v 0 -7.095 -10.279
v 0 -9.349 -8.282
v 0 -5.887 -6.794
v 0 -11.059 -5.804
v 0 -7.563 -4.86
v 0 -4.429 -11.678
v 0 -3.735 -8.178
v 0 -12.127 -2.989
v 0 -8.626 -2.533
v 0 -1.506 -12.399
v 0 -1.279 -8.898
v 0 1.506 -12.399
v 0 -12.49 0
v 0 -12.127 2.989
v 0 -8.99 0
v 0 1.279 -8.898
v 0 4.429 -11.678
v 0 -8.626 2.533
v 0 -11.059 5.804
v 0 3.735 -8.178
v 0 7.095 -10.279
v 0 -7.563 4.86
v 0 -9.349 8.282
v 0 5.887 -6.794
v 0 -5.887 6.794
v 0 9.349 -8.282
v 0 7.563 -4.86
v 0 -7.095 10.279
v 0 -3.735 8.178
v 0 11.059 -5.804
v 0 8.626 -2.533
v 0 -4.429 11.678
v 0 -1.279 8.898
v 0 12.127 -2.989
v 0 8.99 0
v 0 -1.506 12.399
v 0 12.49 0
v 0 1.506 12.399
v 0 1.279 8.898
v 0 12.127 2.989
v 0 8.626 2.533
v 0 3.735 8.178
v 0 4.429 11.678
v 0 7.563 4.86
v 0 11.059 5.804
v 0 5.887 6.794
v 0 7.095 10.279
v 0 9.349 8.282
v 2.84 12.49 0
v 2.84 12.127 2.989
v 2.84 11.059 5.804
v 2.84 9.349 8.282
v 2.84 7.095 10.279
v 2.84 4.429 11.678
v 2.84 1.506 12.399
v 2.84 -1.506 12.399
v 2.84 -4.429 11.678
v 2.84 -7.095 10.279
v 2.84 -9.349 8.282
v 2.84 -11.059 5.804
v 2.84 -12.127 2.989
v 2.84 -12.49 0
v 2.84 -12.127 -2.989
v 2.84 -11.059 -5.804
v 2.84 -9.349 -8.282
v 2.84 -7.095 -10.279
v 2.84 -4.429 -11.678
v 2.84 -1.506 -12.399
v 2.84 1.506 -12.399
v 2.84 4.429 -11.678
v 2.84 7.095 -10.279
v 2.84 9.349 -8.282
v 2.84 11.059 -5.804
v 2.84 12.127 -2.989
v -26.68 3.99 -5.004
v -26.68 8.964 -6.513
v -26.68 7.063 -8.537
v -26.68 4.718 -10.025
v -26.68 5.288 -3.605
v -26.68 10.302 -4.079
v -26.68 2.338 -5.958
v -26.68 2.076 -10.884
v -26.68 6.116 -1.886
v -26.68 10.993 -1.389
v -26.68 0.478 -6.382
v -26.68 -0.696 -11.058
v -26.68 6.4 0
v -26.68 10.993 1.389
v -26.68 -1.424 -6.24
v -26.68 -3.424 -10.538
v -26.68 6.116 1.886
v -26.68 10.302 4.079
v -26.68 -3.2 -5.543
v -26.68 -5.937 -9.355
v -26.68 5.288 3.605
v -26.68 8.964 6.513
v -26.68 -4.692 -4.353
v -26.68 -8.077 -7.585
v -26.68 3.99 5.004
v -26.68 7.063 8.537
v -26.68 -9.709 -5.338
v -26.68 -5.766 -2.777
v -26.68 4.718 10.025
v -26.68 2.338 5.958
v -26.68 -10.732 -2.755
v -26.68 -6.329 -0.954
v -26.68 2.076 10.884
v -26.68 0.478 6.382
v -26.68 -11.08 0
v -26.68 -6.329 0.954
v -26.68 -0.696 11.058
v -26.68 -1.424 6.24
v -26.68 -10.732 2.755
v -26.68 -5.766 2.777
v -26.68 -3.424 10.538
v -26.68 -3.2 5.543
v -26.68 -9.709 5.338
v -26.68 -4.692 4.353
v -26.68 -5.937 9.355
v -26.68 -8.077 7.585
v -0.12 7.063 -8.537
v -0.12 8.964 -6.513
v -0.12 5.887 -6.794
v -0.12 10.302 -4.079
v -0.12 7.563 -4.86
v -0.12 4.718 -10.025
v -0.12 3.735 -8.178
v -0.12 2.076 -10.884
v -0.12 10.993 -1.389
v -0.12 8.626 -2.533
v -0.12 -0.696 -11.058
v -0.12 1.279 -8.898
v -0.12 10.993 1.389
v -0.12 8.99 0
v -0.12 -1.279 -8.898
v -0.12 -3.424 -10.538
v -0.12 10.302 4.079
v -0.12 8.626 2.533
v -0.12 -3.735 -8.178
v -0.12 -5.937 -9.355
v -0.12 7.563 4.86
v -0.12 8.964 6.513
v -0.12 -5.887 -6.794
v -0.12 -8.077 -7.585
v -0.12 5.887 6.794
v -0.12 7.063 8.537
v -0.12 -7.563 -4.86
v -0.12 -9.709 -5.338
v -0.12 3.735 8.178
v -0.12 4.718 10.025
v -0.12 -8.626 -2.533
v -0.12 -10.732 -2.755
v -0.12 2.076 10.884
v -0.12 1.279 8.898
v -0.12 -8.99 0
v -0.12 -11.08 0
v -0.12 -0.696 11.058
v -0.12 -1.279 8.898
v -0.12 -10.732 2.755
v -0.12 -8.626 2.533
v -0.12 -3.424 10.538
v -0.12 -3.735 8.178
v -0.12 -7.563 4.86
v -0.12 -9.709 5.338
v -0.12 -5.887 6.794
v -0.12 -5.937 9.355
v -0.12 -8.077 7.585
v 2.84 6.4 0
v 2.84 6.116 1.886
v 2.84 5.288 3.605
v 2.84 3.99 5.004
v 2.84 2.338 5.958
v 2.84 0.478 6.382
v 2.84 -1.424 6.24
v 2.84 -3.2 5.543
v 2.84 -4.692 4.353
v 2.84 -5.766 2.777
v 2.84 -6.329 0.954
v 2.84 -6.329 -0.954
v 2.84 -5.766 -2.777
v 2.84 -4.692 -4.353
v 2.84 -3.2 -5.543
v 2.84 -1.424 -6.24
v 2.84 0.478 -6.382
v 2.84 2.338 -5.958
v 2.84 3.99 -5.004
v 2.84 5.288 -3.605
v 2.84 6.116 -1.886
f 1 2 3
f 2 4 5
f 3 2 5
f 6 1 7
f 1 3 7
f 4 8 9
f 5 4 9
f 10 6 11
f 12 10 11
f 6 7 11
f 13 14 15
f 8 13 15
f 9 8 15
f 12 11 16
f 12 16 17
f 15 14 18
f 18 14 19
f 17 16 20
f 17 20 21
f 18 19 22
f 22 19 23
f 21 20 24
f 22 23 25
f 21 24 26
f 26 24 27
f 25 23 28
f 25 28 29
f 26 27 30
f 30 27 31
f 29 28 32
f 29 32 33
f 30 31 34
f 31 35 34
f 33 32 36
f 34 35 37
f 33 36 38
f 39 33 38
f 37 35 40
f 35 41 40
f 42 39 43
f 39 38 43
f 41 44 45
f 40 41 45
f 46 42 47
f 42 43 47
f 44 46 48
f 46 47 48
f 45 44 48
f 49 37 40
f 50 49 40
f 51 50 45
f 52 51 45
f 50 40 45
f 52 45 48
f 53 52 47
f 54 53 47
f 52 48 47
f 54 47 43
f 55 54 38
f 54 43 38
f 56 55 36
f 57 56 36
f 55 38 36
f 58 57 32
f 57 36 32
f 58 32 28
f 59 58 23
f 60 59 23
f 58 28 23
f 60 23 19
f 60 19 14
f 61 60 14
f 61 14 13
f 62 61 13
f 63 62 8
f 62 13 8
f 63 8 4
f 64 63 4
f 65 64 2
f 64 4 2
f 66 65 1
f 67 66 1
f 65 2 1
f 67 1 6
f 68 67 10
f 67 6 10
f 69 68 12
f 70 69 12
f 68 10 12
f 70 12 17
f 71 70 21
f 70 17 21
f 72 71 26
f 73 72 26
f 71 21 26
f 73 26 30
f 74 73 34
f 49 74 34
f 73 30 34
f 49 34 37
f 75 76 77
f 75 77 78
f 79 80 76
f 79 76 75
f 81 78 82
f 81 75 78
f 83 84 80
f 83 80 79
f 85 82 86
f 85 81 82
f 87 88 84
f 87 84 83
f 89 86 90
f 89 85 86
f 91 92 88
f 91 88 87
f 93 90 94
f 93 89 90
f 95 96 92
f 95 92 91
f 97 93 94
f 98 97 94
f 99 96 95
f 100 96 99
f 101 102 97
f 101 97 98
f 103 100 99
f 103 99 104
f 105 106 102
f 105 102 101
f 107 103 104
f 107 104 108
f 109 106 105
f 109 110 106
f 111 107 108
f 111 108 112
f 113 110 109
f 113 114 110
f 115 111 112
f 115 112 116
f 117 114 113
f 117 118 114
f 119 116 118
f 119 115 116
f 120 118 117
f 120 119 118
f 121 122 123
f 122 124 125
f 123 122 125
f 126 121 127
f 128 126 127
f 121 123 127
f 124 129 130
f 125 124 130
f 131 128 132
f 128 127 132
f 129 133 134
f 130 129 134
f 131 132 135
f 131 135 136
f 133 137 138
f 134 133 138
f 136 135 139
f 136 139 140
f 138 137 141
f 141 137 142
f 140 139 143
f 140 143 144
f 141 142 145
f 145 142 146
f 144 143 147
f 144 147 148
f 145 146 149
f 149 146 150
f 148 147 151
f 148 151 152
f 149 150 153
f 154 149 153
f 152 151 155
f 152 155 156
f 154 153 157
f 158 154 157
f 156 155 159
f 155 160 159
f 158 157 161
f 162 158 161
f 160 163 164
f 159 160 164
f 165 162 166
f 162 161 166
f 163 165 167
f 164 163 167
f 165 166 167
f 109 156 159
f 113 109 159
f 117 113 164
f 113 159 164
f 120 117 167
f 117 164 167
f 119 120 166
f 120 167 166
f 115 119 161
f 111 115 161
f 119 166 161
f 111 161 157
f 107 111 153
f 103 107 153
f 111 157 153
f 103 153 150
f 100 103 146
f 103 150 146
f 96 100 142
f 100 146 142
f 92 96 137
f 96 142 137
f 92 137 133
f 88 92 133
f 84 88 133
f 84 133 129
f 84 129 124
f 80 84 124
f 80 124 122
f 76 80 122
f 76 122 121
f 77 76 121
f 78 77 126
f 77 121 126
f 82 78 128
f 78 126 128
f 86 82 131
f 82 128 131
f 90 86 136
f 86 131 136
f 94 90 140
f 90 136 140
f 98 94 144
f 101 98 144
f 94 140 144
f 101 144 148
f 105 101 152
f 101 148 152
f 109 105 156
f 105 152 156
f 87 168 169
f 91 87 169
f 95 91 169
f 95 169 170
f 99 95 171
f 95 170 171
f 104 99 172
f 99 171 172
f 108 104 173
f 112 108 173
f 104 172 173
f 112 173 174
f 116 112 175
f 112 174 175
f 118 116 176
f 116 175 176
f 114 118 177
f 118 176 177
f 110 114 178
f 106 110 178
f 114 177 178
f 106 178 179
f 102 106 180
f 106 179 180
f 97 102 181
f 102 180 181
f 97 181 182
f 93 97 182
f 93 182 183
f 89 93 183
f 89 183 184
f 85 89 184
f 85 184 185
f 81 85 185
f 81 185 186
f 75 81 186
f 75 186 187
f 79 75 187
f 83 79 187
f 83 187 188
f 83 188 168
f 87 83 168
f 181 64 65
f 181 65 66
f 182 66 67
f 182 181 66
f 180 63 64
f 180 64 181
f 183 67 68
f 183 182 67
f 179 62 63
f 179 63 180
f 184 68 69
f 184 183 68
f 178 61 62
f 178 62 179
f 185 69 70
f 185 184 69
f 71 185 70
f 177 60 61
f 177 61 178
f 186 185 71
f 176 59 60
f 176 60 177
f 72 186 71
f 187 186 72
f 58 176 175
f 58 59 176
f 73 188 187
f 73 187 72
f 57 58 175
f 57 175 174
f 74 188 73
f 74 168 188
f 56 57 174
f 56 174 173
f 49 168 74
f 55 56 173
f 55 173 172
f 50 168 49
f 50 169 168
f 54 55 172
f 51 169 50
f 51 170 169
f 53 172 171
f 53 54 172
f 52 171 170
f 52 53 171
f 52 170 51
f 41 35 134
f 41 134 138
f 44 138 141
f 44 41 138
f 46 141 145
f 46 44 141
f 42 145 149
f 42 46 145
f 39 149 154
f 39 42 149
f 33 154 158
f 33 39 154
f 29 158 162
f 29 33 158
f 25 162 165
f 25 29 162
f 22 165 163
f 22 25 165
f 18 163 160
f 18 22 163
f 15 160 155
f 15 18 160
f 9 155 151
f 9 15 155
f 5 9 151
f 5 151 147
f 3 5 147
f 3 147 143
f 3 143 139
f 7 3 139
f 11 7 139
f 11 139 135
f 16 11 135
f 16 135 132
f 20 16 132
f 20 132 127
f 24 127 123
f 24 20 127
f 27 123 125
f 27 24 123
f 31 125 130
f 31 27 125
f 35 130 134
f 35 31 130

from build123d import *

# Parameters (mm, degrees)
F0_R     = 12.49
F1_DEPTH = 2.84
F2_R     = 8.99
F3_DEPTH = 0.12
F4_R     = 11.08
F5_DEPTH = 26.56
F6_R     = 6.4
F7_DEPTH = 29.56


with BuildPart() as f1:
    # F0 (on Right) → F1 (new body)
    with BuildSketch(Plane.YZ):
        Circle(F0_R)
    extrude(amount=F1_DEPTH)

    # F2 (on Right) → F3 (join)
    with BuildSketch(Plane.YZ):
        Circle(F2_R)
    extrude(amount=-F3_DEPTH)

    # F4 (on face) → F5 (join)
    with BuildSketch(Plane(origin=(-0.12, 0, 0), x_dir=(0, -1, 0), z_dir=(-1, 0, 0))):
        Circle(F4_R)
    extrude(amount=F5_DEPTH)

    # F6 (on face) → F7 (cut)
    with BuildSketch(Plane.YZ.offset(2.84)):
        Circle(F6_R)
    extrude(amount=-F7_DEPTH, mode=Mode.SUBTRACT)


solid = f1.part
